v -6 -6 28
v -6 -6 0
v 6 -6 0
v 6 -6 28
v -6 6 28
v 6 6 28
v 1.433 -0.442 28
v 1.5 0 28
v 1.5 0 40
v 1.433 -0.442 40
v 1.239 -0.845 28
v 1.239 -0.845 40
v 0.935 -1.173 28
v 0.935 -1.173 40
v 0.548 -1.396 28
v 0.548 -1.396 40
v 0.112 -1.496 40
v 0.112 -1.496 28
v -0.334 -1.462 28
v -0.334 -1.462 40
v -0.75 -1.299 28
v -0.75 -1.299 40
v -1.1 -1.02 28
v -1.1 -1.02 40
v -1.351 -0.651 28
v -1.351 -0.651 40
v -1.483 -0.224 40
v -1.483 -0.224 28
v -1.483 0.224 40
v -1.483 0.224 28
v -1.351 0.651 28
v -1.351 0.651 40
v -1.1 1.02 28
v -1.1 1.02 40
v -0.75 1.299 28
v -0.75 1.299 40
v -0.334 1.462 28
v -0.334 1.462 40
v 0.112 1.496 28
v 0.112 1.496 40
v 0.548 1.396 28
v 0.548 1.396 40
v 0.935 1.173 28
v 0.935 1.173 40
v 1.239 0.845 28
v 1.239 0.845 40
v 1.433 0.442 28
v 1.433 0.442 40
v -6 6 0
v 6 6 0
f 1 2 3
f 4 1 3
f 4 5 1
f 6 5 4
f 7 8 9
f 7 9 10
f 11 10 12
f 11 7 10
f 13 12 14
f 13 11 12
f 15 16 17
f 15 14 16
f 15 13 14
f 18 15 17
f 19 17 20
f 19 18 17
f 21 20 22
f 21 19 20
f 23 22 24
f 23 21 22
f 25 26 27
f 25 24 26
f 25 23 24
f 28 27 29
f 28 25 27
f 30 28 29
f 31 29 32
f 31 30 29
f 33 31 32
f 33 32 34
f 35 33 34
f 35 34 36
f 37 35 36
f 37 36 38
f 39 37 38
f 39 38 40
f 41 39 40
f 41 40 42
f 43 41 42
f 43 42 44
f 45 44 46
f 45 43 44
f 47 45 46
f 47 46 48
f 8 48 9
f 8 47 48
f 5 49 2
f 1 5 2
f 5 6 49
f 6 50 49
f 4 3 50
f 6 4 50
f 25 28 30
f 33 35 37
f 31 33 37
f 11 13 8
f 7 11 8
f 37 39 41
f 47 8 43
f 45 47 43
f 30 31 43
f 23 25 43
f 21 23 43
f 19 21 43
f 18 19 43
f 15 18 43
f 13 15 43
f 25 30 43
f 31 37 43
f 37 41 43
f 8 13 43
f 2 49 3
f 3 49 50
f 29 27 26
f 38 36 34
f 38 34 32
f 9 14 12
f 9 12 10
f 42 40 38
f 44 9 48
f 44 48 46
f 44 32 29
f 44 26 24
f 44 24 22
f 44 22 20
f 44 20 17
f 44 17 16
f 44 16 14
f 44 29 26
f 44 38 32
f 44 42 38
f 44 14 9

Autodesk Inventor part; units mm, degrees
ref_plane "YZ Plane" through (0, 0, 0) normal (1, 0, 0) x (0, 1, 0)
ref_plane "XZ Plane" through (0, 0, 0) normal (0, 1, 0) x (-1, 0, 0)
sketch "Skizze1" plane through (0, 0, 0) normal (0, 0, 1) x (1, 0, 0)
  line L0 (-6, -6) -> (6, -6)
  line L1 (6, -6) -> (6, 6)
  line L2 (6, 6) -> (-6, 6)
  line L3 (-6, 6) -> (-6, -6)
extrude "Extrusion1" add sketch "Skizze1" along normal blind 28
ref_plane "Arbeitsebene1" through (0, 0, 28) normal (0, 0, 1) x (1, 0, 0)
sketch "Skizze2" plane through (0, 0, 28) normal (0, 0, 1) x (1, 0, 0)
  circle A0 centre (0, 0) radius 1.5
extrude "Extrusion2" add sketch "Skizze2" along normal blind 12 separate body
properties part number "Motor_N20_ph"
